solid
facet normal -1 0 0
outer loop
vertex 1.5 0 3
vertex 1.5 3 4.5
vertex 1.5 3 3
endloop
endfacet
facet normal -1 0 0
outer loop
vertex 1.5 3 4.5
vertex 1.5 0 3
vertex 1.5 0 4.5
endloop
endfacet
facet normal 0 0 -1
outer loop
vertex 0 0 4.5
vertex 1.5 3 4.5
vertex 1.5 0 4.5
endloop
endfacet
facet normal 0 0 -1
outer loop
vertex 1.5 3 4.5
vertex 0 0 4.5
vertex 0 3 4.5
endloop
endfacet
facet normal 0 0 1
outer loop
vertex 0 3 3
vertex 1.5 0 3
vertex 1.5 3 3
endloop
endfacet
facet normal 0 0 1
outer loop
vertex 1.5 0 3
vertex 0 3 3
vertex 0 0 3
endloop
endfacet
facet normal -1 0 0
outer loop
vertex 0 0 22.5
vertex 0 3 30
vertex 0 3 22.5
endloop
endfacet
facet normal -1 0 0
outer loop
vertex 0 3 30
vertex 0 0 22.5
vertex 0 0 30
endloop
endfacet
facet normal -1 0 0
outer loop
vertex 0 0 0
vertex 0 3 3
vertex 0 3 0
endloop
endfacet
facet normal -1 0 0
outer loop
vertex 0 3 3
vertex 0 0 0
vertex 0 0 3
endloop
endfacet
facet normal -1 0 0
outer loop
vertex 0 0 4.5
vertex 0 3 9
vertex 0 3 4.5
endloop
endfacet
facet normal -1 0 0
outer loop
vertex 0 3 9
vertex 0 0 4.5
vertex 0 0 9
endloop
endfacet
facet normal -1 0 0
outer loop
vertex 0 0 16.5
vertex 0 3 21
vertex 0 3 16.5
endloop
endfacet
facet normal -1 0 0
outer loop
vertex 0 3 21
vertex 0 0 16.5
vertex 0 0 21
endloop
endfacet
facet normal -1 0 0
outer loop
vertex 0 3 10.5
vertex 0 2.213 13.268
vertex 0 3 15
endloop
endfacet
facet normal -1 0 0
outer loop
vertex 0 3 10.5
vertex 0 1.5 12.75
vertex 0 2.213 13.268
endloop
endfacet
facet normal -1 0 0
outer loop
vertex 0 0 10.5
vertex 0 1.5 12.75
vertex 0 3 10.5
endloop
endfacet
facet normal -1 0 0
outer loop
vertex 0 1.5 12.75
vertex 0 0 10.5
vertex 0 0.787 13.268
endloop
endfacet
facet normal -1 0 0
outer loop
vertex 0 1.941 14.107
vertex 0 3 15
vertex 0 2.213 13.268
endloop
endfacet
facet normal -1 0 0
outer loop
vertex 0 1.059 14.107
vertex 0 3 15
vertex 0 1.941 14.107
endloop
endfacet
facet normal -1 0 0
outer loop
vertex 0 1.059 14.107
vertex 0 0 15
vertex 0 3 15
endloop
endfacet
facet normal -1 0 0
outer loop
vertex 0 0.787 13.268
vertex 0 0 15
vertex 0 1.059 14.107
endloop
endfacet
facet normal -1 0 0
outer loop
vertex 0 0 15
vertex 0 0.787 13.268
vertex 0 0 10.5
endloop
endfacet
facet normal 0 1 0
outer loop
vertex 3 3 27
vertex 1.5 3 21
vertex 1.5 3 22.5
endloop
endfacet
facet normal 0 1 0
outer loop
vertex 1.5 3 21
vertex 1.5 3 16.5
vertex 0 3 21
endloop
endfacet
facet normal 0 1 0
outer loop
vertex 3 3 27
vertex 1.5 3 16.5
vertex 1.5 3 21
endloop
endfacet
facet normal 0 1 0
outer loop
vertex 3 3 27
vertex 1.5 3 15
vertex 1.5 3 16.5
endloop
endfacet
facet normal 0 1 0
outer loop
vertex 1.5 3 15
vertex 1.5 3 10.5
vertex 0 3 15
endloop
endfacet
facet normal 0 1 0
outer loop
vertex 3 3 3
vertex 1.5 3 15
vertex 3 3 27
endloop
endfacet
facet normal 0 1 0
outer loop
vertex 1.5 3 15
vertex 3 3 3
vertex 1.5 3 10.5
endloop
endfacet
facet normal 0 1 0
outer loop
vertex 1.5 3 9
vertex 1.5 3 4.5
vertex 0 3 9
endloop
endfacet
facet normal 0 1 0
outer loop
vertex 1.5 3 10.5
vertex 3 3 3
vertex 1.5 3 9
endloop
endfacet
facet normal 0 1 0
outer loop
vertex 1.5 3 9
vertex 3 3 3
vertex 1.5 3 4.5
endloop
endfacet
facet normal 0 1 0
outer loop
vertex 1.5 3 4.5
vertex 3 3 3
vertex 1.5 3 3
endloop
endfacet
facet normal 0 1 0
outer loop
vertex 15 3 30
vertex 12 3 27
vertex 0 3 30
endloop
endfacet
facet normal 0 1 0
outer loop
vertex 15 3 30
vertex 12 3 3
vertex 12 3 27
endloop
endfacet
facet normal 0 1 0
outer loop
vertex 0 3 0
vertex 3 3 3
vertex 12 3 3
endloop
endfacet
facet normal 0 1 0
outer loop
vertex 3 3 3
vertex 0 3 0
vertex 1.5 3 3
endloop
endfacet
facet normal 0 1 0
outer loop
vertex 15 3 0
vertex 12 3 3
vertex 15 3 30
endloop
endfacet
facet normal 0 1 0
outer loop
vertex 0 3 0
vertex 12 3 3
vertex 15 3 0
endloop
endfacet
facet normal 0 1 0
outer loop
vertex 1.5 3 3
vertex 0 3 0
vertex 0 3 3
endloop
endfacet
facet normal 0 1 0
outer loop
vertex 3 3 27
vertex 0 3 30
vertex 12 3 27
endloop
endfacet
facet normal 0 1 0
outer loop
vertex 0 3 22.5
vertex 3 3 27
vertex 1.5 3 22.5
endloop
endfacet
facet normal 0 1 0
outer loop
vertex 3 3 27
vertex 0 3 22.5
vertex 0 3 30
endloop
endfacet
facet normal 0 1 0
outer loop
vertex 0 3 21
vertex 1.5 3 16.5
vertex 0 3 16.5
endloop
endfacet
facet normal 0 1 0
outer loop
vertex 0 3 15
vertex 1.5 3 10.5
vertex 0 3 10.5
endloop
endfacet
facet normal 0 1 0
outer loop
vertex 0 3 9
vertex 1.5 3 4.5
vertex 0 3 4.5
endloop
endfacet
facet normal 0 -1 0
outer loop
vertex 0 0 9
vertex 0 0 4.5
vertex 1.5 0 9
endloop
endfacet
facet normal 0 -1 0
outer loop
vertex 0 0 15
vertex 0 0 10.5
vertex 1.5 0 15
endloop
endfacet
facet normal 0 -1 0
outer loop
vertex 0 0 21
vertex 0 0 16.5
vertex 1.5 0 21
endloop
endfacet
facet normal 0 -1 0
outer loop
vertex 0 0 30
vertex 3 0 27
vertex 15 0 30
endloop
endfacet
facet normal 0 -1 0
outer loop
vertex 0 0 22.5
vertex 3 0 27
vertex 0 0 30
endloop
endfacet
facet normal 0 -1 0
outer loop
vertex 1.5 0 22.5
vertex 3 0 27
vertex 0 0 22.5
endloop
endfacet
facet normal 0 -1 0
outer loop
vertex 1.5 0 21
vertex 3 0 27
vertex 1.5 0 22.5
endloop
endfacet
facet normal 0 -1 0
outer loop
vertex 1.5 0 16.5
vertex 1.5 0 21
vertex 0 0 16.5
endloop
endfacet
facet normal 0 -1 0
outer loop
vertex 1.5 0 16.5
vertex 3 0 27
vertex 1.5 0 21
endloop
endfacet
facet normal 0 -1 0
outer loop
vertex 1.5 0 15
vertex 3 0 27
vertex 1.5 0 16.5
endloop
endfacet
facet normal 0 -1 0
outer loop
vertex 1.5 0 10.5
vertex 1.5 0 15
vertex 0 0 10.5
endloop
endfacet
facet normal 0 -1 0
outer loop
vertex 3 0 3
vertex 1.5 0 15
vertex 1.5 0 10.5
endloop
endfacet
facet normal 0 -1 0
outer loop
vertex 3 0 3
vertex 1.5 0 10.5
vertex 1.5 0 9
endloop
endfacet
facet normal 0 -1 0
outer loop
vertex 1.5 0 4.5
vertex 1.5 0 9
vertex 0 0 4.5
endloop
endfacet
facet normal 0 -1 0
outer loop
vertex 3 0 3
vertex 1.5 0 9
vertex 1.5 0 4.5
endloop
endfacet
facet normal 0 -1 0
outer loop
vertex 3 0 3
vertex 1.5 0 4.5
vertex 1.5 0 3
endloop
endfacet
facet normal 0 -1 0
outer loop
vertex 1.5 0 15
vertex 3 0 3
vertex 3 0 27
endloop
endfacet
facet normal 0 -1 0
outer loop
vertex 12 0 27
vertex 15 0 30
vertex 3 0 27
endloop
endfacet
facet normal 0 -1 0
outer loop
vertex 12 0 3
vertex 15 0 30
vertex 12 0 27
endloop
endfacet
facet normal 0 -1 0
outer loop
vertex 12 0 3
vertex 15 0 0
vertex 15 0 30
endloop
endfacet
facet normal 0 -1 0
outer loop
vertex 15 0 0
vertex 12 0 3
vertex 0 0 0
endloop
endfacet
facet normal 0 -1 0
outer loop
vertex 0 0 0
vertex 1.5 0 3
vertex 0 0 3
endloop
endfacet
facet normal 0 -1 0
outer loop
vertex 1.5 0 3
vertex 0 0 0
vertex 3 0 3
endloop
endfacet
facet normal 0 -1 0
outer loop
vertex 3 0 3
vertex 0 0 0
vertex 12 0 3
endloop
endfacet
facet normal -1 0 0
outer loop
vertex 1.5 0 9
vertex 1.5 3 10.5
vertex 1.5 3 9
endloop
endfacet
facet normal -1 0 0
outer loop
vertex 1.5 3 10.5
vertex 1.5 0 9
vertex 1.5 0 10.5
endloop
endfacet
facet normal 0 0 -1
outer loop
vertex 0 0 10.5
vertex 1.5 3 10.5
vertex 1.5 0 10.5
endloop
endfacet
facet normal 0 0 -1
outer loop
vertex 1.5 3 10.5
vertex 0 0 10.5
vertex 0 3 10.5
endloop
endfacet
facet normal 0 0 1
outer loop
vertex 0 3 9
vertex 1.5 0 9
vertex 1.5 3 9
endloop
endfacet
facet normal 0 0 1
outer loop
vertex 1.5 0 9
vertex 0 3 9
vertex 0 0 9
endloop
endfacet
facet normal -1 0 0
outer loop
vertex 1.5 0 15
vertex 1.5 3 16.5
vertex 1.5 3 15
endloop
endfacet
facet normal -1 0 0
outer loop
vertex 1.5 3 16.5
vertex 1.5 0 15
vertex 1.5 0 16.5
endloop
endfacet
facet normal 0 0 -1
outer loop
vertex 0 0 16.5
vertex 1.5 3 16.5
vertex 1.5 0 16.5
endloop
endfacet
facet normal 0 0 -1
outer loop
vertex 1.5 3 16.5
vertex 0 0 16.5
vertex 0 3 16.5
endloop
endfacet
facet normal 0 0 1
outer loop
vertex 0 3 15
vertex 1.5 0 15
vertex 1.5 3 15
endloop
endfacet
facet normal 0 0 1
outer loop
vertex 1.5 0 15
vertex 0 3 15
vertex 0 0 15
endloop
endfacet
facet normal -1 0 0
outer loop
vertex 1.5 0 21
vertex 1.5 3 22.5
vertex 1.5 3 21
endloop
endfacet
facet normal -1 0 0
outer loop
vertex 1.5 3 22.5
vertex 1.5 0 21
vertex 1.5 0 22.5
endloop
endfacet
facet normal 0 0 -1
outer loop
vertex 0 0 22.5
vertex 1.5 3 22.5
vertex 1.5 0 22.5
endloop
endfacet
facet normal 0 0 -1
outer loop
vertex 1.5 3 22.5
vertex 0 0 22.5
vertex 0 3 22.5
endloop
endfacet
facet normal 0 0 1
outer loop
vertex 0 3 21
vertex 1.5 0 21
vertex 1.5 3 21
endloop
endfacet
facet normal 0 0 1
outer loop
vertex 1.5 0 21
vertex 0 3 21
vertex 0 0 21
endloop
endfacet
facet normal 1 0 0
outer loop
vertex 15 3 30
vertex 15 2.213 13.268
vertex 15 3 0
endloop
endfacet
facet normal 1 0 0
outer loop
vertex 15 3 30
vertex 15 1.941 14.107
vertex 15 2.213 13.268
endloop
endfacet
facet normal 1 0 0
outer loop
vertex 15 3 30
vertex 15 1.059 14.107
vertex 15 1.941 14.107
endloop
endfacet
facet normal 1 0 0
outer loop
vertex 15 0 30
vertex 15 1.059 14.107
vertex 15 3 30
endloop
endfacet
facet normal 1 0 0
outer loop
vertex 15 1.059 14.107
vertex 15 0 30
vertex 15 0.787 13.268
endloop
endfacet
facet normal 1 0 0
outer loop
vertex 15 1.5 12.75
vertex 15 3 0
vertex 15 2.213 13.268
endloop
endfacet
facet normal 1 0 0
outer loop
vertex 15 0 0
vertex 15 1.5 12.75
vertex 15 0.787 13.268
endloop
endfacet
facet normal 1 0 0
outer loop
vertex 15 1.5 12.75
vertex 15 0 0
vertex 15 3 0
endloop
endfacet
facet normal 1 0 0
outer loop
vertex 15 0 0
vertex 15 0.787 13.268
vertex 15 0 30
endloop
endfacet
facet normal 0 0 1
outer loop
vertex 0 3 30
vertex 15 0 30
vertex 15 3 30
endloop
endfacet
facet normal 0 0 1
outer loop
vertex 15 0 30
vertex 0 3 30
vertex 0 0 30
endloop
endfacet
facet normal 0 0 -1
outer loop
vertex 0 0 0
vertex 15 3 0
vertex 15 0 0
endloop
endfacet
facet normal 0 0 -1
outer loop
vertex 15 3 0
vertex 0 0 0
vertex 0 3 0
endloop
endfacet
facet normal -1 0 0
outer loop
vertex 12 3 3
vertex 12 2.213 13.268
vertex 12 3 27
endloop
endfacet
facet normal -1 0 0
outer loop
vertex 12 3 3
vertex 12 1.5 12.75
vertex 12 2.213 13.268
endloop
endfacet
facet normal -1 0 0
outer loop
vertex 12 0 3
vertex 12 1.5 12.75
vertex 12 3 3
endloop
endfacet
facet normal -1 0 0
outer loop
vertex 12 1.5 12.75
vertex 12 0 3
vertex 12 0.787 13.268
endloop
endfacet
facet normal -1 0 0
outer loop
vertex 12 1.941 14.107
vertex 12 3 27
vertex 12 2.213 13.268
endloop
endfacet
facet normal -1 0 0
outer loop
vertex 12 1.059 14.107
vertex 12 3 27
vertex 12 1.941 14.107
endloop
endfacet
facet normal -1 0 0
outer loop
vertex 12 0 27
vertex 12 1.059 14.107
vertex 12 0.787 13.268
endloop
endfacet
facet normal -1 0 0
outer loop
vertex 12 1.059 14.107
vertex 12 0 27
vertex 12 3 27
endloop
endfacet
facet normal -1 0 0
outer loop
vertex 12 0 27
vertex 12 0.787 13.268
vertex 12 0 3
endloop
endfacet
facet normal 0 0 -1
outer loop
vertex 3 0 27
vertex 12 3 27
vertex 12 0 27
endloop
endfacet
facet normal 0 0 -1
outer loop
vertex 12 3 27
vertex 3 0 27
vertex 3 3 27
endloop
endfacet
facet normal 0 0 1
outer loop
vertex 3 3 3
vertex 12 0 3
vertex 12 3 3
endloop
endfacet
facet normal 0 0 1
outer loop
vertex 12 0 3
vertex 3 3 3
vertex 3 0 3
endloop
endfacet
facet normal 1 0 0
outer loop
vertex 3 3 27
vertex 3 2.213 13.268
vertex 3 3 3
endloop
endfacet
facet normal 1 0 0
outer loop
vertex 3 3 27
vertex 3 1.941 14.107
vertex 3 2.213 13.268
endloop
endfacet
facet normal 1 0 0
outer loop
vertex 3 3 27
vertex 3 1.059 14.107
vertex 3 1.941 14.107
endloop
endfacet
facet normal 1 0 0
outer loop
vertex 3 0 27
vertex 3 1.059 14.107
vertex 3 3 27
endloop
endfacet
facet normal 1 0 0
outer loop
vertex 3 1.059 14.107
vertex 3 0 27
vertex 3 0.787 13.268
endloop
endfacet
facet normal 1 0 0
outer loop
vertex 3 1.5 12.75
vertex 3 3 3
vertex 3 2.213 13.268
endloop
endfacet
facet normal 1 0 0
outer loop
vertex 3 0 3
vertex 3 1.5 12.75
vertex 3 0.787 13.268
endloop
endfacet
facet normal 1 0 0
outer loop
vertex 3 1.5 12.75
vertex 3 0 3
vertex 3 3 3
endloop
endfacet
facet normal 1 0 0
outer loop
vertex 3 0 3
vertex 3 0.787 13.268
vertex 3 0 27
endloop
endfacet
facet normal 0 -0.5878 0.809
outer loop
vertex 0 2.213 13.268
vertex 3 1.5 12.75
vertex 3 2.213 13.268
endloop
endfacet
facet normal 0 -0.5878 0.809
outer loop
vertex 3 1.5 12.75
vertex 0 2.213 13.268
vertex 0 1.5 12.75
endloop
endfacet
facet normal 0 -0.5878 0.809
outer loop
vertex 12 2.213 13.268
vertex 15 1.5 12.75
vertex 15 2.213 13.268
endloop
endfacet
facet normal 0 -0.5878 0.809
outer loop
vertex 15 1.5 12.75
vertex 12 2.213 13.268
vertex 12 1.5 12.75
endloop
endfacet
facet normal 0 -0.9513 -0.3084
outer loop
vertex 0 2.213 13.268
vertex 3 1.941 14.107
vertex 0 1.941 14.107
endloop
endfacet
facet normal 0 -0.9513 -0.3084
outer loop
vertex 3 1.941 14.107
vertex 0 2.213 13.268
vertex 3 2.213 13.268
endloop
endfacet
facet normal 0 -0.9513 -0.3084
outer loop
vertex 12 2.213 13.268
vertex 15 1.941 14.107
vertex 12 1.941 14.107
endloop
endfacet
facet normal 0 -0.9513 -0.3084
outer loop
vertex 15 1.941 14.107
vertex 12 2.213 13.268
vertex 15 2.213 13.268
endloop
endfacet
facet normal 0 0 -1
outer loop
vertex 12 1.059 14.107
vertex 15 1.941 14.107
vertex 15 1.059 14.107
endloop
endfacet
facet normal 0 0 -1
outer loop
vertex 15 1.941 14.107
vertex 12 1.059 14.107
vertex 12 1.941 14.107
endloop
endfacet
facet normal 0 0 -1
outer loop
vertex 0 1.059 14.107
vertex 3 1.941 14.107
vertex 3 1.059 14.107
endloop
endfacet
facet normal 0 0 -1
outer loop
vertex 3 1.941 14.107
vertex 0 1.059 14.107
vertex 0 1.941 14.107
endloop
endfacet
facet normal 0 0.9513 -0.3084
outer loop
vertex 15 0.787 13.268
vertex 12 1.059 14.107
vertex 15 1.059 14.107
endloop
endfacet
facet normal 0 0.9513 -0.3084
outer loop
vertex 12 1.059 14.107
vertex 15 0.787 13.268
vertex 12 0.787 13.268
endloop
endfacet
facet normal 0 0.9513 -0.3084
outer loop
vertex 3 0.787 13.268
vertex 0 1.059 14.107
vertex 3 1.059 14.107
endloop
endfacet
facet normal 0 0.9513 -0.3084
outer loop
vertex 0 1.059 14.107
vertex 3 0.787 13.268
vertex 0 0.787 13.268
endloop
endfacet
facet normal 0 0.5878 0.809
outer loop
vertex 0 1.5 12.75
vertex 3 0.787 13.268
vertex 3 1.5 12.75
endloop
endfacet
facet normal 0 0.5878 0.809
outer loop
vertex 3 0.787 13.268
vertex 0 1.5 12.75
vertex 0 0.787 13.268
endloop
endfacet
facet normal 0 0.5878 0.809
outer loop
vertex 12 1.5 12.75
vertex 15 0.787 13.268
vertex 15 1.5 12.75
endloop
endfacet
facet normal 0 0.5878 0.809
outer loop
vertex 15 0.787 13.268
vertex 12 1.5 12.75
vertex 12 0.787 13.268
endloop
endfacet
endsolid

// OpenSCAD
/**
 * Creates a clip with specified parameters including functional grips.
 *
 * @param width The width of the clip.
 * @param height The height of the clip.
 * @param thickness The thickness of the clip material.
 * @param spring Boolean to add a spring mechanism.
 * @param grip_teeth Boolean to add grip teeth.
 */
module conClip(width = 10, height = 20, thickness = 2, spring = false, grip_teeth = false) {
    difference() {
        // Outer clip
        cube([width, thickness, height]);
        
        // Inner space
        translate([thickness, 0, thickness])
        cube([width - 2 * thickness, thickness, height - 2 * thickness]);
        
        // Spring mechanism
        if (spring) {
            translate([0, thickness / 2, height / 2 - thickness / 2])
            rotate([0, 90, 0])
            cylinder(d = thickness / 2, h = width);
        }
        
        // Grip teeth
        if (grip_teeth) {
            for (i = [thickness : 2 * thickness : height - 2 * thickness]) {
                translate([0, 0, i])
                cube([thickness / 2, thickness, thickness / 2]);
            }
        }
    }
}

// Example usage
conClip(width = 15, height = 30, thickness = 3, spring = true, grip_teeth = true);
